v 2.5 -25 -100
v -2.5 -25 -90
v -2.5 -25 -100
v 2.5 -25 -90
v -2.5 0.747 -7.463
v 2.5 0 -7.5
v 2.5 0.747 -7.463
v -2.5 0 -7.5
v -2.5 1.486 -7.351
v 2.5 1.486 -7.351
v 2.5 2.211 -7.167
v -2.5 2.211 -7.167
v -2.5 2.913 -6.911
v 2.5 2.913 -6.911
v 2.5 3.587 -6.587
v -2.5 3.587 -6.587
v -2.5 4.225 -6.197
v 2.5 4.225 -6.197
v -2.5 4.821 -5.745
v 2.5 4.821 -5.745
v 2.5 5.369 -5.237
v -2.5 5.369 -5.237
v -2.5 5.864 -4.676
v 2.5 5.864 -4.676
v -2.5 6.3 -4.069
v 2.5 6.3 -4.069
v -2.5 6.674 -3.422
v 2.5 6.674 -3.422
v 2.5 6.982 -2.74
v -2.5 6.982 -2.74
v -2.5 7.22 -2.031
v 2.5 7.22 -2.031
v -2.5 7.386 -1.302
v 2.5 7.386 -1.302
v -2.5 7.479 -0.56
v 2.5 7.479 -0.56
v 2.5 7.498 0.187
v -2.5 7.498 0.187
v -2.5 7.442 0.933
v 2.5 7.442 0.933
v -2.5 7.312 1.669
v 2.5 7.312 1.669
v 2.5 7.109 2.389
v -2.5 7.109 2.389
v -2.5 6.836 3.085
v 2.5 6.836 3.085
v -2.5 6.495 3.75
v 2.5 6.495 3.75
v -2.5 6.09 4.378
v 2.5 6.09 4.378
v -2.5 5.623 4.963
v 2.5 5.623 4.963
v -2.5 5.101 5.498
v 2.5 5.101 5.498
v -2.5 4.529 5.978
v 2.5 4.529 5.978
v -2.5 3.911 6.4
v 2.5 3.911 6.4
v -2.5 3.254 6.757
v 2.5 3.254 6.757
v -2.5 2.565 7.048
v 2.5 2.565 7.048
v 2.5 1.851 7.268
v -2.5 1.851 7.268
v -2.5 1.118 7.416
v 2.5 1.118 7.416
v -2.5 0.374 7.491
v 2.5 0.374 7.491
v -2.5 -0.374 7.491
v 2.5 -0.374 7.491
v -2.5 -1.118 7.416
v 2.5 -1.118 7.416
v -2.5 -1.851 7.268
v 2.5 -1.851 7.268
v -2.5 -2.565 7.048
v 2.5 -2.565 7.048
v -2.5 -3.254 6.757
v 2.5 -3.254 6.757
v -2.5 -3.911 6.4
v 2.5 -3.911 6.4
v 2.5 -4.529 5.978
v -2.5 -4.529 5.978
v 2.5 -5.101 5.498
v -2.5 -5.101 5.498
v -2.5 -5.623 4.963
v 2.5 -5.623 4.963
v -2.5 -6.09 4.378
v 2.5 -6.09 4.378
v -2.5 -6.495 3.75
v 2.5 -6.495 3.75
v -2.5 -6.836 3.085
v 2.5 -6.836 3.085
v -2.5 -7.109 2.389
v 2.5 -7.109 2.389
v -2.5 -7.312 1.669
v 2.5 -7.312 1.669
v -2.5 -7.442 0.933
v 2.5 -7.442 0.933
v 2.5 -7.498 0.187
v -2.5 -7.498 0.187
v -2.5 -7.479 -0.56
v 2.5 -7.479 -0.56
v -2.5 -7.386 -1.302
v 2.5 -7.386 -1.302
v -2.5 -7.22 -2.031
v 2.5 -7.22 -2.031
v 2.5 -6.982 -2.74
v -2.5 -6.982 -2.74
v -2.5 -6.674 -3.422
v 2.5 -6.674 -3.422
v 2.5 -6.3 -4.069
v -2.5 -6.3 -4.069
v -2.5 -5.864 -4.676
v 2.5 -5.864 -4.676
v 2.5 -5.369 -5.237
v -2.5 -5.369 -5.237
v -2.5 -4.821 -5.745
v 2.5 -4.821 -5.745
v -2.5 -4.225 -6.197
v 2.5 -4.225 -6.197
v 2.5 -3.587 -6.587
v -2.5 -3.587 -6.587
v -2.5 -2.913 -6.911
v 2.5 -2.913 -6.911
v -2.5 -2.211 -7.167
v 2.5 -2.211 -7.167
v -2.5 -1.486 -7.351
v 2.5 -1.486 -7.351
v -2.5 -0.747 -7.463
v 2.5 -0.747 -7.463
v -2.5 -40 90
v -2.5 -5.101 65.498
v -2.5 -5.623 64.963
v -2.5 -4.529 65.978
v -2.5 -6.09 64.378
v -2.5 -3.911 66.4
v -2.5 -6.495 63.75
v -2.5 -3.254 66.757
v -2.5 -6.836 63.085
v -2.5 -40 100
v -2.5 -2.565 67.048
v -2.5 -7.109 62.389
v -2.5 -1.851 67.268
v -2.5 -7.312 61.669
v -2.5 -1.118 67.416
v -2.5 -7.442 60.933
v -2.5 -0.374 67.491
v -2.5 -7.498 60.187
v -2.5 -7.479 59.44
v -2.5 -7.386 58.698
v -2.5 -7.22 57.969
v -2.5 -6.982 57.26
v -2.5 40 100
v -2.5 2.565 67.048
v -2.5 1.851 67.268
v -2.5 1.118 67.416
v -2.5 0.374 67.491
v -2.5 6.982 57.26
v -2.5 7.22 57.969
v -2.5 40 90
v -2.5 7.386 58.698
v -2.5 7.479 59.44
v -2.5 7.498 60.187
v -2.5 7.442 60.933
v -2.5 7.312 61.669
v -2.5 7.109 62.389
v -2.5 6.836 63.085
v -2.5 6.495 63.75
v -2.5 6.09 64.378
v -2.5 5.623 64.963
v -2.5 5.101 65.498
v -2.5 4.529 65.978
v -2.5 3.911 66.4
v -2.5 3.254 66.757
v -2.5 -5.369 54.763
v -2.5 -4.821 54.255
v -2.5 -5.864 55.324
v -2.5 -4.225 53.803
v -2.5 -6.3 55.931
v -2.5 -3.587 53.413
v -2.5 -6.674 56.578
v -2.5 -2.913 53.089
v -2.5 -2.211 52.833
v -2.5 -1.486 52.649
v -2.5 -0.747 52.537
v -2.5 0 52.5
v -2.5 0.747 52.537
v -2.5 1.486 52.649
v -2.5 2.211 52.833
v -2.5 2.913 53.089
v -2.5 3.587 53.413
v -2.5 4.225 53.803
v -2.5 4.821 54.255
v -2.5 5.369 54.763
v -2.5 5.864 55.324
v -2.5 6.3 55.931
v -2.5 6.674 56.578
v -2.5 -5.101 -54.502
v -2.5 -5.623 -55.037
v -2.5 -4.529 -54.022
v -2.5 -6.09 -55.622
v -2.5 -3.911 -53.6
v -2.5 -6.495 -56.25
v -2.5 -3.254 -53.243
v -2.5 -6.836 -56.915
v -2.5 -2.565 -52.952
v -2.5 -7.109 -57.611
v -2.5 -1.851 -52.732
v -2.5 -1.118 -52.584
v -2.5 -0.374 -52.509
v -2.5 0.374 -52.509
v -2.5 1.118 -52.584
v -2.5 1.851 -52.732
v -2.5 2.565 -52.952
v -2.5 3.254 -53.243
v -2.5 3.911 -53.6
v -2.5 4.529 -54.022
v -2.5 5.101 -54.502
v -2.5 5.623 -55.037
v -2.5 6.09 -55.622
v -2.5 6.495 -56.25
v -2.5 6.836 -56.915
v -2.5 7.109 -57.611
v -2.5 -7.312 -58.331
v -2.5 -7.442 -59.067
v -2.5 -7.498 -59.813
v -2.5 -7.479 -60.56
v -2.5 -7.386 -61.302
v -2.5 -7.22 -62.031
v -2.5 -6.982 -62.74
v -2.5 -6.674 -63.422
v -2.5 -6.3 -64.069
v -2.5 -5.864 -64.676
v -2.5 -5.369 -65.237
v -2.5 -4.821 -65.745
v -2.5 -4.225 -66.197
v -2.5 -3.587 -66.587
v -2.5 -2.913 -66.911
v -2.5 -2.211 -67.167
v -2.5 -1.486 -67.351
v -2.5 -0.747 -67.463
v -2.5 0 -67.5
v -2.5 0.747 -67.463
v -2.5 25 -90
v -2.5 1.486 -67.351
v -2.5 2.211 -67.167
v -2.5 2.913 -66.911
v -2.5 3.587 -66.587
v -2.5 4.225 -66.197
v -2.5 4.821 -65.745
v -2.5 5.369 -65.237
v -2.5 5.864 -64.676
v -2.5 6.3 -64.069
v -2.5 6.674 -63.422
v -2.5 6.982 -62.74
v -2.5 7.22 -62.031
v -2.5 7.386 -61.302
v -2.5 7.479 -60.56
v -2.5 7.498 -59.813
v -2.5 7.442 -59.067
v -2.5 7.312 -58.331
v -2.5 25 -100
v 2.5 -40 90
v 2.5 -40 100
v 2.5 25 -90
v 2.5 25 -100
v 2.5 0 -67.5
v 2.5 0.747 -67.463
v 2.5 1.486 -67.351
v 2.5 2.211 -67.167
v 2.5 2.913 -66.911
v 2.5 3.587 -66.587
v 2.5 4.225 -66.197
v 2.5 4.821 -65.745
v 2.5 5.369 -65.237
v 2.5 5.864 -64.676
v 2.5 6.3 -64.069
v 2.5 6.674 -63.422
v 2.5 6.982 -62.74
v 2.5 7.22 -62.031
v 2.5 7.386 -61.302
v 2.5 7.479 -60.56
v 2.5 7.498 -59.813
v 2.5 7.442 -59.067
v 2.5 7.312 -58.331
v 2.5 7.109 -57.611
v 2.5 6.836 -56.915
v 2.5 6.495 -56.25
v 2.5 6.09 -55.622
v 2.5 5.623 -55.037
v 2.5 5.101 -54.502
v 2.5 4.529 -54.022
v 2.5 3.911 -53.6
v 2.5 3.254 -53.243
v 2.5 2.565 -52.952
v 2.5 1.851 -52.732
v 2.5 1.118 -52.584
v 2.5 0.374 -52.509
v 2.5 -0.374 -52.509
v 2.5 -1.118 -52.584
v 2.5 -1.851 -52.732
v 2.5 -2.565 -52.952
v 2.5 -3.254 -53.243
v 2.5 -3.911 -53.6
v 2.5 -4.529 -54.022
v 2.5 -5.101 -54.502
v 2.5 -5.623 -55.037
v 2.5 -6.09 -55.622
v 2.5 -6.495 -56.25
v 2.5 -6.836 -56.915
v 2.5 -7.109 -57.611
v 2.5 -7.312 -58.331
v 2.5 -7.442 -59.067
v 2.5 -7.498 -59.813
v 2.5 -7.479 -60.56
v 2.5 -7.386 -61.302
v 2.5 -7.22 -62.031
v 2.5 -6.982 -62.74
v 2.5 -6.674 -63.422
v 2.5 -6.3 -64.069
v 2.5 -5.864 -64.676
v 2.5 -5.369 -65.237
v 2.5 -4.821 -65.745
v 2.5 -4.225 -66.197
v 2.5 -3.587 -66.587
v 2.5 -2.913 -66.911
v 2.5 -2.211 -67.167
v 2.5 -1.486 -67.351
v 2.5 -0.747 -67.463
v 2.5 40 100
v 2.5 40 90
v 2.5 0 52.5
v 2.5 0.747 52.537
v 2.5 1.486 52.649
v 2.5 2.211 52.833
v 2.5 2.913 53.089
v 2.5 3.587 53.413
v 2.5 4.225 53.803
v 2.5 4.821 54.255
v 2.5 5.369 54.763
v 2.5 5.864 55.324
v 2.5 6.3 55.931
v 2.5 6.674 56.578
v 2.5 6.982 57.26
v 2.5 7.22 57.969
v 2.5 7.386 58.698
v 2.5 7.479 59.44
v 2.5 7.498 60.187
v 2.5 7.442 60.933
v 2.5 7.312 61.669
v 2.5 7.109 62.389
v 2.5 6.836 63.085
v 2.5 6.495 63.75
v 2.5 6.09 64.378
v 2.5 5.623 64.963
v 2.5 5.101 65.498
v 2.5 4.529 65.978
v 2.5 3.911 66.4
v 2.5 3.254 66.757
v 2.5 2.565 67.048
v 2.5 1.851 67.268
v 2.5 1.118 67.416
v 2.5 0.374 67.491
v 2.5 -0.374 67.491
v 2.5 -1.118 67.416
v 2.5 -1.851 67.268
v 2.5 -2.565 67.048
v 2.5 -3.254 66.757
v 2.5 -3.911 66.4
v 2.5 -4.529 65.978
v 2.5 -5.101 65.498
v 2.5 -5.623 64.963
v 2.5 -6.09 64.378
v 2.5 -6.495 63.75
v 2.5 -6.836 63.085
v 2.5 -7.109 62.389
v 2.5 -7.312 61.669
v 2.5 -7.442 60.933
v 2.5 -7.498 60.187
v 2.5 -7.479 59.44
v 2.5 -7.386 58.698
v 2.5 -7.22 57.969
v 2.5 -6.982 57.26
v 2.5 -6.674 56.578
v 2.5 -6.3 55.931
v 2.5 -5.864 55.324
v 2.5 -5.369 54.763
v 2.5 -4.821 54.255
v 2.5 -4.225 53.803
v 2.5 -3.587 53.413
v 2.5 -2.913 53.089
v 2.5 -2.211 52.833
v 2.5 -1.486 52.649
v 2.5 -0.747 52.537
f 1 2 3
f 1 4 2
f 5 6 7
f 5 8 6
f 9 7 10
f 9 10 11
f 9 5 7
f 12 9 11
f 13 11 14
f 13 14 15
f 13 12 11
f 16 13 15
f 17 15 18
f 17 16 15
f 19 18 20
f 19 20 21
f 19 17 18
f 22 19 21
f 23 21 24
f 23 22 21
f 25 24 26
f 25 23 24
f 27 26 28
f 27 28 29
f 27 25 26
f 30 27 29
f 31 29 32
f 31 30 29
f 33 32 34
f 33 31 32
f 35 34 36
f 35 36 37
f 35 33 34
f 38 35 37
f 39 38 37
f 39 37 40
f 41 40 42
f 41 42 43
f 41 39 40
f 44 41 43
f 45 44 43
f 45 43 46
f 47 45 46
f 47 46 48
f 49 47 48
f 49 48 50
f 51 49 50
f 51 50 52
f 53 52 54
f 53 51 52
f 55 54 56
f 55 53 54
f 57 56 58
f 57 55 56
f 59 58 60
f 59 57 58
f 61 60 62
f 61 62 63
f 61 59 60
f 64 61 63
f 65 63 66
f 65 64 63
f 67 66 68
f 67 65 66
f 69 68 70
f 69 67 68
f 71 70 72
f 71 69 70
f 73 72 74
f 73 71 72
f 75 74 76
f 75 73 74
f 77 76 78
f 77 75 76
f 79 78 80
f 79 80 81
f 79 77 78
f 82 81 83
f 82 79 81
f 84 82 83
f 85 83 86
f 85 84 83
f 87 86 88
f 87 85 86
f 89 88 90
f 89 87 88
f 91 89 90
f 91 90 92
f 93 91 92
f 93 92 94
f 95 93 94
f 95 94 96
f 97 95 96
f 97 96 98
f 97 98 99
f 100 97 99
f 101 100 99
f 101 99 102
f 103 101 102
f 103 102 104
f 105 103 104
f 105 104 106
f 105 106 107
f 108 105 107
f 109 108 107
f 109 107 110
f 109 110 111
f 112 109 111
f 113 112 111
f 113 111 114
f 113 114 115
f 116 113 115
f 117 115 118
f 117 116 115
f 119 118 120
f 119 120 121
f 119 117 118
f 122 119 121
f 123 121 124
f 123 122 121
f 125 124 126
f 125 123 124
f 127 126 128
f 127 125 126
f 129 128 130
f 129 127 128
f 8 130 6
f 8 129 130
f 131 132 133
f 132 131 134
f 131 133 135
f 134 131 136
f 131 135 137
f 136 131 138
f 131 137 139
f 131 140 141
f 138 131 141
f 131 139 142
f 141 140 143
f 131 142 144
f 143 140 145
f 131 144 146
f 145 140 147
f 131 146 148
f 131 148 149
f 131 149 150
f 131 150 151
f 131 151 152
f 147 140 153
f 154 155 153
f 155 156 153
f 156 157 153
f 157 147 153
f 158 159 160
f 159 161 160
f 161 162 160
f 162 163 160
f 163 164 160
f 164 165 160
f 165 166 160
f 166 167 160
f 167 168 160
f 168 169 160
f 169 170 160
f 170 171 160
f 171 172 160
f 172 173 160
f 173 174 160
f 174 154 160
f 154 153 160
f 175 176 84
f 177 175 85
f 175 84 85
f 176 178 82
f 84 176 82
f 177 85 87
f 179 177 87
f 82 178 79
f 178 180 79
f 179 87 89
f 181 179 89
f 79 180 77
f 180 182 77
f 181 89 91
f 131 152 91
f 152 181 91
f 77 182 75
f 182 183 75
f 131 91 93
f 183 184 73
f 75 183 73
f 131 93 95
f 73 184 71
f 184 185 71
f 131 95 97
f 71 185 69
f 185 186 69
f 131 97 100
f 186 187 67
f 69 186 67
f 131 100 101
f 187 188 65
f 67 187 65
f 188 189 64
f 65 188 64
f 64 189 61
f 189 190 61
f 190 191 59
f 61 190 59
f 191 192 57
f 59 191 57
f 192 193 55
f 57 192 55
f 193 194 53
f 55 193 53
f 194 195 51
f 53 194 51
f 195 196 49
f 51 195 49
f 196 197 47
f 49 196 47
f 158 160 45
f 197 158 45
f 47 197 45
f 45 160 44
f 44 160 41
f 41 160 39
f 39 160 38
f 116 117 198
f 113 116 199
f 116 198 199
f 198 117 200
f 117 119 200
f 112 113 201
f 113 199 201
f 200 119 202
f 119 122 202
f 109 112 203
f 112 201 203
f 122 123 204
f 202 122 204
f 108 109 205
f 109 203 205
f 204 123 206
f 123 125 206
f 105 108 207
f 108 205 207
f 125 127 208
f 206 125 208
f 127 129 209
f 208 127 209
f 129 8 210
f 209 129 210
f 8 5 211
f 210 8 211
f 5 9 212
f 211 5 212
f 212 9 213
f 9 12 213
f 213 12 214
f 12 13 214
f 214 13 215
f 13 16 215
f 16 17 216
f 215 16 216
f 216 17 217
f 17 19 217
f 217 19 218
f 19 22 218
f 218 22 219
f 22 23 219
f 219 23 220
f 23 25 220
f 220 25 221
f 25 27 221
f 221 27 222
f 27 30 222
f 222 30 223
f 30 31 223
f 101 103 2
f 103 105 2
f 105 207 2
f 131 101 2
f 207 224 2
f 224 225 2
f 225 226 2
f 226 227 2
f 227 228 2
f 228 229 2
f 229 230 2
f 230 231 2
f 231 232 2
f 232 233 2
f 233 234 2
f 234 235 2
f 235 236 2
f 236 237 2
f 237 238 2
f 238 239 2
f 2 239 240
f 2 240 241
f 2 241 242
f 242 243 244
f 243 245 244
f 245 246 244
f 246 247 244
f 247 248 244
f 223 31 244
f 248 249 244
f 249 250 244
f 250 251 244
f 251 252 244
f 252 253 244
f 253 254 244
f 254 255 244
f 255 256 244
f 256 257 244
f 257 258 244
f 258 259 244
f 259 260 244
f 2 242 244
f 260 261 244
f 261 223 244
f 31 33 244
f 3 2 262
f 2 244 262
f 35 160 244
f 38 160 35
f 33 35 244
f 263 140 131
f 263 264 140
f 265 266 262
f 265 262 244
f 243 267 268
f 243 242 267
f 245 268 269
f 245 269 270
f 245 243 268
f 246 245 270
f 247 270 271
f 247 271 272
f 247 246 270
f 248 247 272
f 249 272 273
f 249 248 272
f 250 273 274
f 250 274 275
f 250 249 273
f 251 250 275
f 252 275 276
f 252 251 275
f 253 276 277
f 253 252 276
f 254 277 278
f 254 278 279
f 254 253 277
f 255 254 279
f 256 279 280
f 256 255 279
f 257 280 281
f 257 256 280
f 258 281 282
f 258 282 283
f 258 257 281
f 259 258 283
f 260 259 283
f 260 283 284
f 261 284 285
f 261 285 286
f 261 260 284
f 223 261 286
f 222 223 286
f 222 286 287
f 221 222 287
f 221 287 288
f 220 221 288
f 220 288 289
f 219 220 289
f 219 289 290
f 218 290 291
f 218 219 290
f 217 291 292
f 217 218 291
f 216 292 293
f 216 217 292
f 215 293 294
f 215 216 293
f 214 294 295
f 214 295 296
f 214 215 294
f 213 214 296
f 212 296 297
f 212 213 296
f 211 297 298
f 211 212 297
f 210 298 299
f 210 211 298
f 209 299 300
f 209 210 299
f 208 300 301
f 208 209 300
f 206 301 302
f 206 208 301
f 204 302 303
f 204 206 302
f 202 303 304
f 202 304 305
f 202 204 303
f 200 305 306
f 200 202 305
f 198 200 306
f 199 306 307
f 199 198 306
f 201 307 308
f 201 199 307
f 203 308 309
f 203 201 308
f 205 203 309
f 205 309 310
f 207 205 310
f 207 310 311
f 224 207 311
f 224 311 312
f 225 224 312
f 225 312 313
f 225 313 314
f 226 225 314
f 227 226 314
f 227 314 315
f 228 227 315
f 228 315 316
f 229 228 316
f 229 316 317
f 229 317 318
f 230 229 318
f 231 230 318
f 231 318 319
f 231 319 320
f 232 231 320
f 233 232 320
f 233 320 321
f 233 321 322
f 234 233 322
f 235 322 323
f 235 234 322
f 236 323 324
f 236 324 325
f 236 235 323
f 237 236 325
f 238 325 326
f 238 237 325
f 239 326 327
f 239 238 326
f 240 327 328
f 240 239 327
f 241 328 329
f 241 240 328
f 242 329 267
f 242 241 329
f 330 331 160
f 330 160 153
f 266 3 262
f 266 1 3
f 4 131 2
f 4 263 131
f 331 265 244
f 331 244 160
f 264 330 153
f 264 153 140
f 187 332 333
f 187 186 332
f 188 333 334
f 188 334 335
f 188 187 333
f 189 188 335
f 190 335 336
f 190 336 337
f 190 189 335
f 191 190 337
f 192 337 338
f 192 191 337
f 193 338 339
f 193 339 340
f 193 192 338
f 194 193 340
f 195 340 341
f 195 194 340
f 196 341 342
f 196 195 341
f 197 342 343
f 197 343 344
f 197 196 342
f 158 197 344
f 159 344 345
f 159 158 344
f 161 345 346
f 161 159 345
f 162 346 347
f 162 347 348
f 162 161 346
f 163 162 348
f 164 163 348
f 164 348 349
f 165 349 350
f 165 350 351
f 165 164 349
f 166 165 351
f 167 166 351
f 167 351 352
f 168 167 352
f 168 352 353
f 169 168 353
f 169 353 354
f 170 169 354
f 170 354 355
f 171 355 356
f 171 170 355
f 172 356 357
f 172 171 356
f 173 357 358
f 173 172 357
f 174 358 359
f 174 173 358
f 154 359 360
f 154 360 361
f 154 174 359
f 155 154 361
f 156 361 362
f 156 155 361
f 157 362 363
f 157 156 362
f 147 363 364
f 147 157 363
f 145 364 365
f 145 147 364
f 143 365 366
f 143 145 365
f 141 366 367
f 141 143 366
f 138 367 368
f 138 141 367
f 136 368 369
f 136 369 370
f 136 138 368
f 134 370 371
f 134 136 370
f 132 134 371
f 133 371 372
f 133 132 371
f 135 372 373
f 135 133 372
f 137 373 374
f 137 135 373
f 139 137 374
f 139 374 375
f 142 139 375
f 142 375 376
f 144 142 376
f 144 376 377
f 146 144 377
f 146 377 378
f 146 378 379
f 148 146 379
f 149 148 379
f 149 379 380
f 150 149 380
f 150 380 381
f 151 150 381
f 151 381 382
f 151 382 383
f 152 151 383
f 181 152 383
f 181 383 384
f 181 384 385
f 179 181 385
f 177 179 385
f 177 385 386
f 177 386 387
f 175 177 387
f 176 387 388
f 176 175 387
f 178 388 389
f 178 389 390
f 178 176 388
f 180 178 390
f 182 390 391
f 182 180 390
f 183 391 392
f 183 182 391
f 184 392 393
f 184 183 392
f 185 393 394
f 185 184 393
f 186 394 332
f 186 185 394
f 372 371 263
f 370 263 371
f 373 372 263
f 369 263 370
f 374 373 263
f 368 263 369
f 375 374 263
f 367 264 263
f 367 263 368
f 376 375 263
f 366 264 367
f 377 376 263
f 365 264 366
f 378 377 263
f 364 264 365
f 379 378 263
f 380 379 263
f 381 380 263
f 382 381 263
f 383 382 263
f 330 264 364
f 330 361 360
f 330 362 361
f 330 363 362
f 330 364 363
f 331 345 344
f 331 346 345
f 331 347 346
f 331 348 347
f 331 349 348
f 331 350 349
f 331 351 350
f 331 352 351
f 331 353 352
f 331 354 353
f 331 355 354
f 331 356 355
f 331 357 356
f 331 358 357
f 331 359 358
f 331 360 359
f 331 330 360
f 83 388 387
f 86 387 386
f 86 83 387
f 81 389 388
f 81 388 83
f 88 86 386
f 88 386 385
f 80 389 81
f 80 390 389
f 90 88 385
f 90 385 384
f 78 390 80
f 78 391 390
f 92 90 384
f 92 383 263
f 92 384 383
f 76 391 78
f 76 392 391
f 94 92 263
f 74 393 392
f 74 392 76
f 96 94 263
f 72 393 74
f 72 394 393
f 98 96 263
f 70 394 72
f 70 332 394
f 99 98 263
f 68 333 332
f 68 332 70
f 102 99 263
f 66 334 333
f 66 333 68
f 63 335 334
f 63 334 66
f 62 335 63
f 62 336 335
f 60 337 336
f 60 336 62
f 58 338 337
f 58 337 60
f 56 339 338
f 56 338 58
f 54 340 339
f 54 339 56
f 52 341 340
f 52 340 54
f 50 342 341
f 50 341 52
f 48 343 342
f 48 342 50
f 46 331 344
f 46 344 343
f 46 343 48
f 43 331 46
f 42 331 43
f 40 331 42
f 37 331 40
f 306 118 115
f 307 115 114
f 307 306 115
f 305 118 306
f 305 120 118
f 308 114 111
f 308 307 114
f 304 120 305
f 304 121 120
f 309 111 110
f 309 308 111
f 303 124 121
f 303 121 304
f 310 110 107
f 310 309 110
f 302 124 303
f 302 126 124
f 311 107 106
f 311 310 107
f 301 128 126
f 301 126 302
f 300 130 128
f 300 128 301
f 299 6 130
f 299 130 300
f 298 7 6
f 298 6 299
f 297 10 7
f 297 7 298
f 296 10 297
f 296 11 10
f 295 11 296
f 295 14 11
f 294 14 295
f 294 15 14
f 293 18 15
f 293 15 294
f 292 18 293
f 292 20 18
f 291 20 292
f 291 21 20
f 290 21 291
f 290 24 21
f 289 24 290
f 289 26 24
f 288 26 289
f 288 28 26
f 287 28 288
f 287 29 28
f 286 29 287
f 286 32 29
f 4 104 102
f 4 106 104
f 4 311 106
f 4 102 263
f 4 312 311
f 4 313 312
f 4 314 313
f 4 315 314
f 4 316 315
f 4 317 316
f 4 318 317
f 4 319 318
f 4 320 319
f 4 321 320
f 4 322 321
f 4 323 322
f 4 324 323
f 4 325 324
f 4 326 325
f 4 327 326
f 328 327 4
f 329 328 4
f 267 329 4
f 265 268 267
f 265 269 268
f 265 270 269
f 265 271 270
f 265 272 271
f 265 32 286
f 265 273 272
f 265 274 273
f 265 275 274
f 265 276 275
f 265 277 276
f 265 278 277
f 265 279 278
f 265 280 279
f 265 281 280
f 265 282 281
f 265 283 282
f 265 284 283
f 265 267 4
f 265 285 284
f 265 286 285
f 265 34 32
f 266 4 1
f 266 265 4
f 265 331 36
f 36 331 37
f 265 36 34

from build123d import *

# Parameters (mm, degrees)
SKETCH1_R           = 7.5
BOSS_EXTRUDE1_DEPTH = 2.5


with BuildPart() as part:
    # Sketch1 → Boss-Extrude1 (new, symmetric)
    with BuildSketch(Plane(origin=(0, 0, 0), x_dir=(0, 0, -1), z_dir=(1, 0, 0))):
        Polygon((100, -25), (100, 25), (90, 25), (-90, 40), (-100, 40), (-100, -40), (-90, -40), (90, -25), align=None)
        Circle(SKETCH1_R, mode=Mode.SUBTRACT)
        with Locations((-60, 0)):
            Circle(SKETCH1_R, mode=Mode.SUBTRACT)
        with Locations((60, 0)):
            Circle(SKETCH1_R, mode=Mode.SUBTRACT)
    extrude(amount=BOSS_EXTRUDE1_DEPTH, both=True)


solid = part.part
